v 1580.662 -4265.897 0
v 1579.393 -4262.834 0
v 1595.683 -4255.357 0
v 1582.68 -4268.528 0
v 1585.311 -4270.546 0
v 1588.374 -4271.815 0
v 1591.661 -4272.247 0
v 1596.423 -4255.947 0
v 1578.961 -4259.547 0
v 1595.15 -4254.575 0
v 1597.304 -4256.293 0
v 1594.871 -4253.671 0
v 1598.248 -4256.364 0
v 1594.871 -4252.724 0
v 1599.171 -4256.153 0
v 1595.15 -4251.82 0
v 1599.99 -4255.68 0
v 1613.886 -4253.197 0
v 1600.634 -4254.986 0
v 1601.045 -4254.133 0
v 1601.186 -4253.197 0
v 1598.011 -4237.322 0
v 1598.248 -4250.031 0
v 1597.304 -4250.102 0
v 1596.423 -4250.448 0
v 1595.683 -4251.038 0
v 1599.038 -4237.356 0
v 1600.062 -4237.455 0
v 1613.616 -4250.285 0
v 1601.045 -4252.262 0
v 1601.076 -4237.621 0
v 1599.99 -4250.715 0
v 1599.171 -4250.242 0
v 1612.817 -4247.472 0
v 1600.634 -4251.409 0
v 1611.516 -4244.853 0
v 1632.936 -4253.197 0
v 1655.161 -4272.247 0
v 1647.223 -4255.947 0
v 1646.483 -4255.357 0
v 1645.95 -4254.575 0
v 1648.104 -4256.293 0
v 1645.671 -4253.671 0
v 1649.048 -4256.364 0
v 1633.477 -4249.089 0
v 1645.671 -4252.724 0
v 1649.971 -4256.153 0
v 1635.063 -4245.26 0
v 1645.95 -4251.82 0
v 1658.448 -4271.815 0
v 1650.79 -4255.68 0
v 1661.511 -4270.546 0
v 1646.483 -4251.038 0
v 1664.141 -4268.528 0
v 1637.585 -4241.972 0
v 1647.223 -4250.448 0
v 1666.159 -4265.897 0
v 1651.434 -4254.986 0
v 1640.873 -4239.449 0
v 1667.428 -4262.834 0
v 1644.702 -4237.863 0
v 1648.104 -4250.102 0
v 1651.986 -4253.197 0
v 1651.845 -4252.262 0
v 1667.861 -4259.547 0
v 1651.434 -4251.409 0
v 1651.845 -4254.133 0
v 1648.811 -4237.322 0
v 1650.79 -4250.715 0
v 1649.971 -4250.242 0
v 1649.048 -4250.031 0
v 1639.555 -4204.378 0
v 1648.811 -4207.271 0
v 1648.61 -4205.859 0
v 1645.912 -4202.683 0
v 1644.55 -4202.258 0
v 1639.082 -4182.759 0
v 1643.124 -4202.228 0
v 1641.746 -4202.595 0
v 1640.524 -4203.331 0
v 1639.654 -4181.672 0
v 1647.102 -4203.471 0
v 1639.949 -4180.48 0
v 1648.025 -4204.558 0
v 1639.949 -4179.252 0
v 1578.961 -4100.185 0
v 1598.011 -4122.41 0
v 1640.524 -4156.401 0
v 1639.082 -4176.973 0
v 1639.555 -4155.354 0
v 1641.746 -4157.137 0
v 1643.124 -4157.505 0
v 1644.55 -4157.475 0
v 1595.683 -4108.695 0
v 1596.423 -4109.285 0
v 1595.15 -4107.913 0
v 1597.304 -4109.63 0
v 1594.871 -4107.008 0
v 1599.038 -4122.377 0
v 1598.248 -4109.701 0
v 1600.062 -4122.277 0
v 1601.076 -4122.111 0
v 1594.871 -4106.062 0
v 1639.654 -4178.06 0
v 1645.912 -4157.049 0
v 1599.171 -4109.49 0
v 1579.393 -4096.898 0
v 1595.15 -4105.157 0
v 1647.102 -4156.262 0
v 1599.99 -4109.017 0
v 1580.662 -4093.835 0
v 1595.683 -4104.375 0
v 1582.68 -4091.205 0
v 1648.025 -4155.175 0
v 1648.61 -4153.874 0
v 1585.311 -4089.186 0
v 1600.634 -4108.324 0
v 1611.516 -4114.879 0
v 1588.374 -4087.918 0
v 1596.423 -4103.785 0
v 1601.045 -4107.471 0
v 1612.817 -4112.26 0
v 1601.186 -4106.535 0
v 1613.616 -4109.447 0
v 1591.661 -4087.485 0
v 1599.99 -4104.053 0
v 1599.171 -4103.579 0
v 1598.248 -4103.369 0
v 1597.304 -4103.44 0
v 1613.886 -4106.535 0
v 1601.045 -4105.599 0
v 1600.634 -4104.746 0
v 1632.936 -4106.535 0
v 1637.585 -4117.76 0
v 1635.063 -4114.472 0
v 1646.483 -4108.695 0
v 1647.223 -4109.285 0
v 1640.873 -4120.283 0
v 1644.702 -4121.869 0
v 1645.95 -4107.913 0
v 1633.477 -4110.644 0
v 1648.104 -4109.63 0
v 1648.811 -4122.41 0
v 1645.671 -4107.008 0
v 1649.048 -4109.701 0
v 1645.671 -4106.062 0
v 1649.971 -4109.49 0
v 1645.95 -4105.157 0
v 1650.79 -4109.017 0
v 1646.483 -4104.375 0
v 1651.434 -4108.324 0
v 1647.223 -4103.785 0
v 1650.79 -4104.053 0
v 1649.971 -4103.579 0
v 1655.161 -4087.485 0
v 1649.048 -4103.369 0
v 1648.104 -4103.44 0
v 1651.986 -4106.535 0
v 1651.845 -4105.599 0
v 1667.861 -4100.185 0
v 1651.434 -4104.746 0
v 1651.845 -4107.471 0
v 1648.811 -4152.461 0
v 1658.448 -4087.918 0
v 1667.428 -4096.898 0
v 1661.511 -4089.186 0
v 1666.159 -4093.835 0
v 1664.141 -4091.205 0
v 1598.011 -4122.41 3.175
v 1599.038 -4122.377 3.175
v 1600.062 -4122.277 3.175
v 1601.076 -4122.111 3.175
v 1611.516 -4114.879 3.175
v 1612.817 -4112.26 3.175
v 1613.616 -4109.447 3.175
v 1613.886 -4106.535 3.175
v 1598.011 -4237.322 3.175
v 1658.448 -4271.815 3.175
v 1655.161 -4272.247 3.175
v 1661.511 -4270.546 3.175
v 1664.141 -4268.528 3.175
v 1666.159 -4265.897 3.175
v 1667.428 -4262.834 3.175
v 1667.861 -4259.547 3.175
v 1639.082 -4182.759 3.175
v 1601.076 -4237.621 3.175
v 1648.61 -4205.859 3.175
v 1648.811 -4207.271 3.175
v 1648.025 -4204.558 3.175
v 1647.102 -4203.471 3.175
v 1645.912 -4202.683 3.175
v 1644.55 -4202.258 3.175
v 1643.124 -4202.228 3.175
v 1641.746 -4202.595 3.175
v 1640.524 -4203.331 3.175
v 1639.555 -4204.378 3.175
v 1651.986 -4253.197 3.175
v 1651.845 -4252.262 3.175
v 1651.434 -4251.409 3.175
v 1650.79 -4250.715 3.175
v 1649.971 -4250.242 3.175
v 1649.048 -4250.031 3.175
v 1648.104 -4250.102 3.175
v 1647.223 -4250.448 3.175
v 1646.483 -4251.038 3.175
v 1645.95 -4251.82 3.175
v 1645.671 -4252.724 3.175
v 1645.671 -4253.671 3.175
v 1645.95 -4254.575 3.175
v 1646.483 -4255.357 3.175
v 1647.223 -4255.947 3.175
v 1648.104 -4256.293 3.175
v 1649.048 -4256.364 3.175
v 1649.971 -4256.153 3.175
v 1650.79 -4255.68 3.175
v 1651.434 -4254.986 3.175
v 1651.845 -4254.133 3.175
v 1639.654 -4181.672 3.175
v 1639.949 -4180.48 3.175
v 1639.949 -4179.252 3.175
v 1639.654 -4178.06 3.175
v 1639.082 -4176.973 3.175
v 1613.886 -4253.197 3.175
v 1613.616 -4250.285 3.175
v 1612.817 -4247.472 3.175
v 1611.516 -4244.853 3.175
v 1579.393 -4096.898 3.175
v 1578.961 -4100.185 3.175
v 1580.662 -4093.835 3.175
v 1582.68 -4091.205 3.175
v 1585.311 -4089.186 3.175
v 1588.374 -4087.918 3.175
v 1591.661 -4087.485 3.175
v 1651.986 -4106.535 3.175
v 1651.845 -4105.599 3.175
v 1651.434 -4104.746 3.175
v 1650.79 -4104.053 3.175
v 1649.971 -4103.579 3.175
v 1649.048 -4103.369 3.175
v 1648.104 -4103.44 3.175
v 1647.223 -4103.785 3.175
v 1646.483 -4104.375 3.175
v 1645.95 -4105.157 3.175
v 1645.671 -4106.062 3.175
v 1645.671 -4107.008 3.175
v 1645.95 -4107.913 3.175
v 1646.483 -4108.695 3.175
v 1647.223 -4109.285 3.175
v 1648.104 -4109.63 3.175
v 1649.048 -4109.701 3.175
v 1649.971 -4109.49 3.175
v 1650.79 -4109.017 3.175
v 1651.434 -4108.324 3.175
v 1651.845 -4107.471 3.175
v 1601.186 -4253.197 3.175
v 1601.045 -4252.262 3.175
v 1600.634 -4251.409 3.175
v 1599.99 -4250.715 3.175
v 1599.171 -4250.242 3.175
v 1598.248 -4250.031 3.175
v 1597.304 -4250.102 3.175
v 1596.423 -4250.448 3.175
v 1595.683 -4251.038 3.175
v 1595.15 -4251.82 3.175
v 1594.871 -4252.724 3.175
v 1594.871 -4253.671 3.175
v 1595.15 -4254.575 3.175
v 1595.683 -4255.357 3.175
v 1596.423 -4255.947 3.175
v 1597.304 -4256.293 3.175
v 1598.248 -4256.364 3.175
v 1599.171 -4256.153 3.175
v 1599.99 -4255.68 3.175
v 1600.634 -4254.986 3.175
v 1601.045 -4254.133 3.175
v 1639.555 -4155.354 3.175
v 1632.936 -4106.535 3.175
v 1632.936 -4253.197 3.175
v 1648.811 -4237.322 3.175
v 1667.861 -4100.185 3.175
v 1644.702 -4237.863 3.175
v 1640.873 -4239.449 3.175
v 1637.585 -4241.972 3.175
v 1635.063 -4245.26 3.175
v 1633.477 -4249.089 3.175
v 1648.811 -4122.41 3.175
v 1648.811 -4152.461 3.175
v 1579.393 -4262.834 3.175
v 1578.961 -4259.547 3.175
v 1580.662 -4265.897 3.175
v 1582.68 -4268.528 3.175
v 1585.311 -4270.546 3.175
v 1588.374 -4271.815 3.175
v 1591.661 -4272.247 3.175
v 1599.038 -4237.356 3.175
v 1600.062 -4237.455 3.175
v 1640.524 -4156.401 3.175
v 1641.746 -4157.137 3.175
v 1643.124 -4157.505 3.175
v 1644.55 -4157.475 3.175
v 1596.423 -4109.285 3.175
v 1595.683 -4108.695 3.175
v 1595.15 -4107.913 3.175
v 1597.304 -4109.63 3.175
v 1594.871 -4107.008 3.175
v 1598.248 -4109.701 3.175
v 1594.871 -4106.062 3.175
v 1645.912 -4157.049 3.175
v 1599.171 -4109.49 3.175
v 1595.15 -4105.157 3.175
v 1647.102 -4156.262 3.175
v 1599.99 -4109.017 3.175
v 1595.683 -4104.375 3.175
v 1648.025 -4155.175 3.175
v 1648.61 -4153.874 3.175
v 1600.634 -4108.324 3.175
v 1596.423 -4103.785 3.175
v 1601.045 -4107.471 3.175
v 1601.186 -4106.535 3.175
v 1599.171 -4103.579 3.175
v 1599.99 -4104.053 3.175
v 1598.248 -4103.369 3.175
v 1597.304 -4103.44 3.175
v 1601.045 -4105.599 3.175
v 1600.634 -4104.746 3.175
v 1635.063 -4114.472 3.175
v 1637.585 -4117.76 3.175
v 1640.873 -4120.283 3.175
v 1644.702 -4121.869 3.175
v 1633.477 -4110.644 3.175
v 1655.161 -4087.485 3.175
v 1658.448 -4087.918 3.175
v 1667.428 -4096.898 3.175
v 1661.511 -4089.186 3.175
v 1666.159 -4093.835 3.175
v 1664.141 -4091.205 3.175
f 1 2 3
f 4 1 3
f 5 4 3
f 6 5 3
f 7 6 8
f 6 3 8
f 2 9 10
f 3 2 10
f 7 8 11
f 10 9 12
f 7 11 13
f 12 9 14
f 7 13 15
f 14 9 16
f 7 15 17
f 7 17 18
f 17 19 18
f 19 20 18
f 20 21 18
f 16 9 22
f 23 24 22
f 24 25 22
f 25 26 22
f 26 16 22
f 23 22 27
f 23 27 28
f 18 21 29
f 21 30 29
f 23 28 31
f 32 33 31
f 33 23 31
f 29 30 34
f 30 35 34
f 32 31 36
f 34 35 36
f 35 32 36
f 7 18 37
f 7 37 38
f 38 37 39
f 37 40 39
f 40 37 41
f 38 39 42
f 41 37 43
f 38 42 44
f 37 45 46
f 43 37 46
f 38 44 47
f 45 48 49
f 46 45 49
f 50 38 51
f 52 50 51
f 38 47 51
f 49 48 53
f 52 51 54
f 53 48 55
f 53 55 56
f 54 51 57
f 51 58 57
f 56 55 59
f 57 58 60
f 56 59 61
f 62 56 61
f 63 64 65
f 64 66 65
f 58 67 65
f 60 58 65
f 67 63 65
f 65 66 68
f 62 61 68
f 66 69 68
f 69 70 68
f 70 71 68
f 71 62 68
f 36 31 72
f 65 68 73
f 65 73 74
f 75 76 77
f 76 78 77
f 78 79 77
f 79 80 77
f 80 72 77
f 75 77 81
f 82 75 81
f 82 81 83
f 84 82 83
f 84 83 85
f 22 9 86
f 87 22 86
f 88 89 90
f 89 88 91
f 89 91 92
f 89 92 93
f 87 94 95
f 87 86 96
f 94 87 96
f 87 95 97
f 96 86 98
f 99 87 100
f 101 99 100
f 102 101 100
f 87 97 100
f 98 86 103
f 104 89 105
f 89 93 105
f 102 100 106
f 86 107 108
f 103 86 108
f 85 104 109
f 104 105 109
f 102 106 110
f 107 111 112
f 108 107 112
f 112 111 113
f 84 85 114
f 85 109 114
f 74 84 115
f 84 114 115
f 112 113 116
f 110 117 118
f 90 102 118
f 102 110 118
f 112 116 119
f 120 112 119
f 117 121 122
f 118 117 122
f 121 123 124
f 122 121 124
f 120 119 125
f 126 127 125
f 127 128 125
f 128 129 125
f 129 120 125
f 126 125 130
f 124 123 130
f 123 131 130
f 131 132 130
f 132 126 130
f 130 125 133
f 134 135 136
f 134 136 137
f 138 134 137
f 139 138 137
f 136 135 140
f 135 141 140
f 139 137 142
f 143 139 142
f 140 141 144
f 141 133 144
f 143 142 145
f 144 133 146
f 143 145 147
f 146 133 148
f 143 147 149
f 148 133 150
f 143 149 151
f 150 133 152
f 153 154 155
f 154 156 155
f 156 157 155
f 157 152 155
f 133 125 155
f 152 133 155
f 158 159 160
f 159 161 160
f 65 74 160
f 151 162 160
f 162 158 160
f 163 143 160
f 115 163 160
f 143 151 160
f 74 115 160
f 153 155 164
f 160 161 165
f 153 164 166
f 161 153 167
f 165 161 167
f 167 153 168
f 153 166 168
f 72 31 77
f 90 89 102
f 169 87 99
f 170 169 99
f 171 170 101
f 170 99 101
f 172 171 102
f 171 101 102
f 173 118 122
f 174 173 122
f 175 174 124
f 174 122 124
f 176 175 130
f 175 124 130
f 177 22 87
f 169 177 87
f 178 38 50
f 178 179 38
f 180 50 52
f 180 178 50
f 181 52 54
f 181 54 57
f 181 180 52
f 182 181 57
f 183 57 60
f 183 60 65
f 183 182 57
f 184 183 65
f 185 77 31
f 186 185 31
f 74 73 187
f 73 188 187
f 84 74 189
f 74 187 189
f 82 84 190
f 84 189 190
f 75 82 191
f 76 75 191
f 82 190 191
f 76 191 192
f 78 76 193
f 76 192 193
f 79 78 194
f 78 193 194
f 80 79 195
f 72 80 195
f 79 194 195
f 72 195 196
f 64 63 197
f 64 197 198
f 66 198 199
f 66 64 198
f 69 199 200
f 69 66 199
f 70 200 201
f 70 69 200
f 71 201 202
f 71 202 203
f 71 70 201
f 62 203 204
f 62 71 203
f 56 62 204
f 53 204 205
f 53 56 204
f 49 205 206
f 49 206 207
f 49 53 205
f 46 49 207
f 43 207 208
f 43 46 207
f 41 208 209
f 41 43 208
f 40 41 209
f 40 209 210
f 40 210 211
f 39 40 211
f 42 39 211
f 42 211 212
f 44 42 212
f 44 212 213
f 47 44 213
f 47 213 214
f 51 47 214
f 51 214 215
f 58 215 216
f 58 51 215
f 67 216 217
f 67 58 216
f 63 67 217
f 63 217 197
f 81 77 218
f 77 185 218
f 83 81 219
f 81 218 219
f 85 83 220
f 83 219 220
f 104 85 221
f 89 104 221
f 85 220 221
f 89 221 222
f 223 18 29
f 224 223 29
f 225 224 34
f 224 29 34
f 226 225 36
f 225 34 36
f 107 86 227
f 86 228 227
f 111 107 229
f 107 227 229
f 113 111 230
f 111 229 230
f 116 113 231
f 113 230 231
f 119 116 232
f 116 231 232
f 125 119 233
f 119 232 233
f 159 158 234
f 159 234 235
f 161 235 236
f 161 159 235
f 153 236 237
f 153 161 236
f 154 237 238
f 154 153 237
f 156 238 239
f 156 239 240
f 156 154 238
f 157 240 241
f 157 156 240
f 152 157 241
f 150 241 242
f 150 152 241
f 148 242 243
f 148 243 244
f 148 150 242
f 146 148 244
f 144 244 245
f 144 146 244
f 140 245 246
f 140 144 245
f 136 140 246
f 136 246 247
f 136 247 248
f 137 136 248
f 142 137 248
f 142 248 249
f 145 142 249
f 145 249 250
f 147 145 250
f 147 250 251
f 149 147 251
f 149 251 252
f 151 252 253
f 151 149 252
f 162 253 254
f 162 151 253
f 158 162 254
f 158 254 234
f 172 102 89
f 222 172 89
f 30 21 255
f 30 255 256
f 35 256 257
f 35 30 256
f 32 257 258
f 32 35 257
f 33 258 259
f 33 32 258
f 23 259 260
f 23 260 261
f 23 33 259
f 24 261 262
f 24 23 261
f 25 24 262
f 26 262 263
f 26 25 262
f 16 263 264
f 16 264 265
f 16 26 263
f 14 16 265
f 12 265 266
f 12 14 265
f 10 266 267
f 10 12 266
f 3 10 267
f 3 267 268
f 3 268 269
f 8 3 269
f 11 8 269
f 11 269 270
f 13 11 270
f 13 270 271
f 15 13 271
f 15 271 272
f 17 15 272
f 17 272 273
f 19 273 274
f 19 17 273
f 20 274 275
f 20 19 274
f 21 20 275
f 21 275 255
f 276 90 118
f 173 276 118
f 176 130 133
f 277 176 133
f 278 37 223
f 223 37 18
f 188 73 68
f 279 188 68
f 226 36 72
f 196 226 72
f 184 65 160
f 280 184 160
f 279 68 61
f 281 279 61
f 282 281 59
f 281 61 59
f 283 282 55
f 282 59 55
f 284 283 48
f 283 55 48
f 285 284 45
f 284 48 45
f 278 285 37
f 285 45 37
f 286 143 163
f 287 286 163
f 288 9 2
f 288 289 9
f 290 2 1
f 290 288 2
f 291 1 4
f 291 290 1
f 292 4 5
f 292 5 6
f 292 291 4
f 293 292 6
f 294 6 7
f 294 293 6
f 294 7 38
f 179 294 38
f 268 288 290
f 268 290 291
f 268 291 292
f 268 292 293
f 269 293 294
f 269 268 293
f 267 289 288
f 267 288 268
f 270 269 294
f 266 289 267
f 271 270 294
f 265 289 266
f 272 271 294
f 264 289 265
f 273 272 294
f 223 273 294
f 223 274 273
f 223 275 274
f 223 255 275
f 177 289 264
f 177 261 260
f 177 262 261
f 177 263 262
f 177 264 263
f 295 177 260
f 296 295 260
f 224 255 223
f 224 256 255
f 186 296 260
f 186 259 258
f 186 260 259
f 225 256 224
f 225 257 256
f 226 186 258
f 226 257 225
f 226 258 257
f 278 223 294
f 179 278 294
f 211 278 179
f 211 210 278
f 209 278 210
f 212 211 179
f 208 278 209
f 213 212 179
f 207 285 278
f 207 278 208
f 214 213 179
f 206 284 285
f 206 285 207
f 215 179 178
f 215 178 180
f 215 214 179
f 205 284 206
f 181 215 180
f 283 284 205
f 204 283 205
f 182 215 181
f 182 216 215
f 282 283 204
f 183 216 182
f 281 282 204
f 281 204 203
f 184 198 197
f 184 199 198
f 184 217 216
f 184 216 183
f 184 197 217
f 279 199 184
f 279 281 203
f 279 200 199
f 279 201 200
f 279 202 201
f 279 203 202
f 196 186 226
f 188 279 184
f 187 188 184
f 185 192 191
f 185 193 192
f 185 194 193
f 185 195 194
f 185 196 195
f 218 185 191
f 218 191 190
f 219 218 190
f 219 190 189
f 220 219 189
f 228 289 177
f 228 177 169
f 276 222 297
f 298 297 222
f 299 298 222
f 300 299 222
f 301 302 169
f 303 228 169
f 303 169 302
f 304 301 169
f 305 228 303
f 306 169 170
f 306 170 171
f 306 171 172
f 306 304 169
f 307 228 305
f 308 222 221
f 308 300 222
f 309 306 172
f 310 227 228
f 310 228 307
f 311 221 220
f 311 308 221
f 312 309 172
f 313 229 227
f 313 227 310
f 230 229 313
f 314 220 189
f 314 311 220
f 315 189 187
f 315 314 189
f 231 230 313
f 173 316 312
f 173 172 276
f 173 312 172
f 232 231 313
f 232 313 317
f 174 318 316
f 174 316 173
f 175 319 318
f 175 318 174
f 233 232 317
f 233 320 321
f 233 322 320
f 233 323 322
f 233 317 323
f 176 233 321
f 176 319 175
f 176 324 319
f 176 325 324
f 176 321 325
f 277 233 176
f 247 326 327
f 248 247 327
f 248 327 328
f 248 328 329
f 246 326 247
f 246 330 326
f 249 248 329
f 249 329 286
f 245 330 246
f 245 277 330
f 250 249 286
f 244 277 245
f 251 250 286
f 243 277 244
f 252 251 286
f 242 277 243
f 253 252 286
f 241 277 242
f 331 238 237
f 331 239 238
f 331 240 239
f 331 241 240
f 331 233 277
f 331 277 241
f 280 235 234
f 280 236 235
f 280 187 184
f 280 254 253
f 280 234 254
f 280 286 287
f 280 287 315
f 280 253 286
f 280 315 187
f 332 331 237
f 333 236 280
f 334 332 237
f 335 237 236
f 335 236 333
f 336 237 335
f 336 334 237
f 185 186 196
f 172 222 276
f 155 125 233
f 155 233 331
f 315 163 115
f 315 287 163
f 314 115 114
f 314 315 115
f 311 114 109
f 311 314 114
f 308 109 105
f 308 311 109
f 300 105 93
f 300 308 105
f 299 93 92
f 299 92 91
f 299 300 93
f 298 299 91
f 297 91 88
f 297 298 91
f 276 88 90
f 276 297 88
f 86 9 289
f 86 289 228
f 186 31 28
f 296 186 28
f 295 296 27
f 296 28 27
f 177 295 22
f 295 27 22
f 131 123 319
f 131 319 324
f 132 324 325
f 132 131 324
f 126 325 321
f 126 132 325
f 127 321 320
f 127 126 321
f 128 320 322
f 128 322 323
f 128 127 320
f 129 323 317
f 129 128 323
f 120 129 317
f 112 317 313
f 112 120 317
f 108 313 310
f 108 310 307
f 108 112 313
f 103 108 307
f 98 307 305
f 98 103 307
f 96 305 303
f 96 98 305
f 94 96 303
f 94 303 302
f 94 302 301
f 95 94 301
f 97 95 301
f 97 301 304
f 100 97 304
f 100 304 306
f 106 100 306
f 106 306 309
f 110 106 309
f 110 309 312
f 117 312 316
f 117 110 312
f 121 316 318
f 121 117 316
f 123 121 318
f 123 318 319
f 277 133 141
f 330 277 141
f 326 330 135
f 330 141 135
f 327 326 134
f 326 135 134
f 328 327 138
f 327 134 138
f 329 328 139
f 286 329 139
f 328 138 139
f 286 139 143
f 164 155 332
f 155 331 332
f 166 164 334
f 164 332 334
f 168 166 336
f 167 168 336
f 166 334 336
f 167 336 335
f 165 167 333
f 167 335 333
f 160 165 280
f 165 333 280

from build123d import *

# Parameters (mm, degrees)
SKETCH1_W           = 88.9
SKETCH1_H           = 184.762458854
SKETCH1_R           = 3.175
BOSS_EXTRUDE1_DEPTH = 3.175
FILLET1_R           = 5.08
FILLET2_R           = 12.7


with BuildPart() as part:
    # Sketch1 → Boss-Extrude1 (new body)
    with BuildSketch(Plane.XY):
        with Locations((1623.410721097, -4179.866189559)):
            Rectangle(SKETCH1_W, SKETCH1_H)
        with Locations((1598.010721097, -4106.534960132)):
            Circle(SKETCH1_R, mode=Mode.SUBTRACT)
        with BuildLine():
            Line((1648.810721097, -4168.715160172), (1611.515942217, -4114.879097445))
            ThreePointArc((1611.515942217, -4114.879097445), (1613.281788681, -4110.872023639), (1613.885721097, -4106.534960132))
            Line((1613.885721097, -4106.534960132), (1632.935721097, -4106.534960132))
            ThreePointArc((1632.935721097, -4106.534960132), (1637.585400946, -4117.760280283), (1648.810721097, -4122.409960132))
            Line((1648.810721097, -4122.409960132), (1648.810721097, -4168.715160172))
        make_face(mode=Mode.SUBTRACT)
        with BuildLine():
            ThreePointArc((1598.010721097, -4122.409960132), (1599.550748635, -4122.335084821), (1601.076248923, -4122.111165194))
            Line((1601.076248923, -4122.111165194), (1641.085877299, -4179.866189559))
            Line((1641.085877299, -4179.866189559), (1601.076248923, -4237.621213923))
            ThreePointArc((1601.076248923, -4237.621213923), (1599.550748635, -4237.397294297), (1598.010721097, -4237.322418986))
            Line((1598.010721097, -4237.322418986), (1598.010721097, -4122.409960132))
        make_face(mode=Mode.SUBTRACT)
        with BuildLine():
            ThreePointArc((1613.885721097, -4253.197418986), (1613.281788681, -4248.860355479), (1611.515942217, -4244.853281672))
            Line((1611.515942217, -4244.853281672), (1648.810721097, -4191.017218946))
            Line((1648.810721097, -4191.017218946), (1648.810721097, -4237.322418986))
            ThreePointArc((1648.810721097, -4237.322418986), (1637.585400946, -4241.972098834), (1632.935721097, -4253.197418986))
            Line((1632.935721097, -4253.197418986), (1613.885721097, -4253.197418986))
        make_face(mode=Mode.SUBTRACT)
        with Locations((1598.010721097, -4253.197418986)):
            Circle(SKETCH1_R, mode=Mode.SUBTRACT)
        with Locations((1648.810721097, -4106.534960132)):
            Circle(SKETCH1_R, mode=Mode.SUBTRACT)
        with Locations((1648.810721097, -4253.197418986)):
            Circle(SKETCH1_R, mode=Mode.SUBTRACT)
    extrude(amount=BOSS_EXTRUDE1_DEPTH)

    # Fillet1
    fillet1_edges = [part.edges().sort_by_distance(p)[0] for p in [
        (1648.810721097, -4191.017218946, 1.5875),
        (1641.085877299, -4179.866189559, 1.5875),
        (1648.810721097, -4168.715160172, 1.5875),
    ]]
    fillet(fillet1_edges, radius=FILLET1_R)

    # Fillet2
    fillet2_edges = [part.edges().sort_by_distance(p)[0] for p in [
        (1667.860721097, -4272.247418986, 1.5875),
        (1578.960721097, -4272.247418986, 1.5875),
        (1578.960721097, -4087.484960132, 1.5875),
        (1667.860721097, -4087.484960132, 1.5875),
    ]]
    fillet(fillet2_edges, radius=FILLET2_R)


solid = part.part
